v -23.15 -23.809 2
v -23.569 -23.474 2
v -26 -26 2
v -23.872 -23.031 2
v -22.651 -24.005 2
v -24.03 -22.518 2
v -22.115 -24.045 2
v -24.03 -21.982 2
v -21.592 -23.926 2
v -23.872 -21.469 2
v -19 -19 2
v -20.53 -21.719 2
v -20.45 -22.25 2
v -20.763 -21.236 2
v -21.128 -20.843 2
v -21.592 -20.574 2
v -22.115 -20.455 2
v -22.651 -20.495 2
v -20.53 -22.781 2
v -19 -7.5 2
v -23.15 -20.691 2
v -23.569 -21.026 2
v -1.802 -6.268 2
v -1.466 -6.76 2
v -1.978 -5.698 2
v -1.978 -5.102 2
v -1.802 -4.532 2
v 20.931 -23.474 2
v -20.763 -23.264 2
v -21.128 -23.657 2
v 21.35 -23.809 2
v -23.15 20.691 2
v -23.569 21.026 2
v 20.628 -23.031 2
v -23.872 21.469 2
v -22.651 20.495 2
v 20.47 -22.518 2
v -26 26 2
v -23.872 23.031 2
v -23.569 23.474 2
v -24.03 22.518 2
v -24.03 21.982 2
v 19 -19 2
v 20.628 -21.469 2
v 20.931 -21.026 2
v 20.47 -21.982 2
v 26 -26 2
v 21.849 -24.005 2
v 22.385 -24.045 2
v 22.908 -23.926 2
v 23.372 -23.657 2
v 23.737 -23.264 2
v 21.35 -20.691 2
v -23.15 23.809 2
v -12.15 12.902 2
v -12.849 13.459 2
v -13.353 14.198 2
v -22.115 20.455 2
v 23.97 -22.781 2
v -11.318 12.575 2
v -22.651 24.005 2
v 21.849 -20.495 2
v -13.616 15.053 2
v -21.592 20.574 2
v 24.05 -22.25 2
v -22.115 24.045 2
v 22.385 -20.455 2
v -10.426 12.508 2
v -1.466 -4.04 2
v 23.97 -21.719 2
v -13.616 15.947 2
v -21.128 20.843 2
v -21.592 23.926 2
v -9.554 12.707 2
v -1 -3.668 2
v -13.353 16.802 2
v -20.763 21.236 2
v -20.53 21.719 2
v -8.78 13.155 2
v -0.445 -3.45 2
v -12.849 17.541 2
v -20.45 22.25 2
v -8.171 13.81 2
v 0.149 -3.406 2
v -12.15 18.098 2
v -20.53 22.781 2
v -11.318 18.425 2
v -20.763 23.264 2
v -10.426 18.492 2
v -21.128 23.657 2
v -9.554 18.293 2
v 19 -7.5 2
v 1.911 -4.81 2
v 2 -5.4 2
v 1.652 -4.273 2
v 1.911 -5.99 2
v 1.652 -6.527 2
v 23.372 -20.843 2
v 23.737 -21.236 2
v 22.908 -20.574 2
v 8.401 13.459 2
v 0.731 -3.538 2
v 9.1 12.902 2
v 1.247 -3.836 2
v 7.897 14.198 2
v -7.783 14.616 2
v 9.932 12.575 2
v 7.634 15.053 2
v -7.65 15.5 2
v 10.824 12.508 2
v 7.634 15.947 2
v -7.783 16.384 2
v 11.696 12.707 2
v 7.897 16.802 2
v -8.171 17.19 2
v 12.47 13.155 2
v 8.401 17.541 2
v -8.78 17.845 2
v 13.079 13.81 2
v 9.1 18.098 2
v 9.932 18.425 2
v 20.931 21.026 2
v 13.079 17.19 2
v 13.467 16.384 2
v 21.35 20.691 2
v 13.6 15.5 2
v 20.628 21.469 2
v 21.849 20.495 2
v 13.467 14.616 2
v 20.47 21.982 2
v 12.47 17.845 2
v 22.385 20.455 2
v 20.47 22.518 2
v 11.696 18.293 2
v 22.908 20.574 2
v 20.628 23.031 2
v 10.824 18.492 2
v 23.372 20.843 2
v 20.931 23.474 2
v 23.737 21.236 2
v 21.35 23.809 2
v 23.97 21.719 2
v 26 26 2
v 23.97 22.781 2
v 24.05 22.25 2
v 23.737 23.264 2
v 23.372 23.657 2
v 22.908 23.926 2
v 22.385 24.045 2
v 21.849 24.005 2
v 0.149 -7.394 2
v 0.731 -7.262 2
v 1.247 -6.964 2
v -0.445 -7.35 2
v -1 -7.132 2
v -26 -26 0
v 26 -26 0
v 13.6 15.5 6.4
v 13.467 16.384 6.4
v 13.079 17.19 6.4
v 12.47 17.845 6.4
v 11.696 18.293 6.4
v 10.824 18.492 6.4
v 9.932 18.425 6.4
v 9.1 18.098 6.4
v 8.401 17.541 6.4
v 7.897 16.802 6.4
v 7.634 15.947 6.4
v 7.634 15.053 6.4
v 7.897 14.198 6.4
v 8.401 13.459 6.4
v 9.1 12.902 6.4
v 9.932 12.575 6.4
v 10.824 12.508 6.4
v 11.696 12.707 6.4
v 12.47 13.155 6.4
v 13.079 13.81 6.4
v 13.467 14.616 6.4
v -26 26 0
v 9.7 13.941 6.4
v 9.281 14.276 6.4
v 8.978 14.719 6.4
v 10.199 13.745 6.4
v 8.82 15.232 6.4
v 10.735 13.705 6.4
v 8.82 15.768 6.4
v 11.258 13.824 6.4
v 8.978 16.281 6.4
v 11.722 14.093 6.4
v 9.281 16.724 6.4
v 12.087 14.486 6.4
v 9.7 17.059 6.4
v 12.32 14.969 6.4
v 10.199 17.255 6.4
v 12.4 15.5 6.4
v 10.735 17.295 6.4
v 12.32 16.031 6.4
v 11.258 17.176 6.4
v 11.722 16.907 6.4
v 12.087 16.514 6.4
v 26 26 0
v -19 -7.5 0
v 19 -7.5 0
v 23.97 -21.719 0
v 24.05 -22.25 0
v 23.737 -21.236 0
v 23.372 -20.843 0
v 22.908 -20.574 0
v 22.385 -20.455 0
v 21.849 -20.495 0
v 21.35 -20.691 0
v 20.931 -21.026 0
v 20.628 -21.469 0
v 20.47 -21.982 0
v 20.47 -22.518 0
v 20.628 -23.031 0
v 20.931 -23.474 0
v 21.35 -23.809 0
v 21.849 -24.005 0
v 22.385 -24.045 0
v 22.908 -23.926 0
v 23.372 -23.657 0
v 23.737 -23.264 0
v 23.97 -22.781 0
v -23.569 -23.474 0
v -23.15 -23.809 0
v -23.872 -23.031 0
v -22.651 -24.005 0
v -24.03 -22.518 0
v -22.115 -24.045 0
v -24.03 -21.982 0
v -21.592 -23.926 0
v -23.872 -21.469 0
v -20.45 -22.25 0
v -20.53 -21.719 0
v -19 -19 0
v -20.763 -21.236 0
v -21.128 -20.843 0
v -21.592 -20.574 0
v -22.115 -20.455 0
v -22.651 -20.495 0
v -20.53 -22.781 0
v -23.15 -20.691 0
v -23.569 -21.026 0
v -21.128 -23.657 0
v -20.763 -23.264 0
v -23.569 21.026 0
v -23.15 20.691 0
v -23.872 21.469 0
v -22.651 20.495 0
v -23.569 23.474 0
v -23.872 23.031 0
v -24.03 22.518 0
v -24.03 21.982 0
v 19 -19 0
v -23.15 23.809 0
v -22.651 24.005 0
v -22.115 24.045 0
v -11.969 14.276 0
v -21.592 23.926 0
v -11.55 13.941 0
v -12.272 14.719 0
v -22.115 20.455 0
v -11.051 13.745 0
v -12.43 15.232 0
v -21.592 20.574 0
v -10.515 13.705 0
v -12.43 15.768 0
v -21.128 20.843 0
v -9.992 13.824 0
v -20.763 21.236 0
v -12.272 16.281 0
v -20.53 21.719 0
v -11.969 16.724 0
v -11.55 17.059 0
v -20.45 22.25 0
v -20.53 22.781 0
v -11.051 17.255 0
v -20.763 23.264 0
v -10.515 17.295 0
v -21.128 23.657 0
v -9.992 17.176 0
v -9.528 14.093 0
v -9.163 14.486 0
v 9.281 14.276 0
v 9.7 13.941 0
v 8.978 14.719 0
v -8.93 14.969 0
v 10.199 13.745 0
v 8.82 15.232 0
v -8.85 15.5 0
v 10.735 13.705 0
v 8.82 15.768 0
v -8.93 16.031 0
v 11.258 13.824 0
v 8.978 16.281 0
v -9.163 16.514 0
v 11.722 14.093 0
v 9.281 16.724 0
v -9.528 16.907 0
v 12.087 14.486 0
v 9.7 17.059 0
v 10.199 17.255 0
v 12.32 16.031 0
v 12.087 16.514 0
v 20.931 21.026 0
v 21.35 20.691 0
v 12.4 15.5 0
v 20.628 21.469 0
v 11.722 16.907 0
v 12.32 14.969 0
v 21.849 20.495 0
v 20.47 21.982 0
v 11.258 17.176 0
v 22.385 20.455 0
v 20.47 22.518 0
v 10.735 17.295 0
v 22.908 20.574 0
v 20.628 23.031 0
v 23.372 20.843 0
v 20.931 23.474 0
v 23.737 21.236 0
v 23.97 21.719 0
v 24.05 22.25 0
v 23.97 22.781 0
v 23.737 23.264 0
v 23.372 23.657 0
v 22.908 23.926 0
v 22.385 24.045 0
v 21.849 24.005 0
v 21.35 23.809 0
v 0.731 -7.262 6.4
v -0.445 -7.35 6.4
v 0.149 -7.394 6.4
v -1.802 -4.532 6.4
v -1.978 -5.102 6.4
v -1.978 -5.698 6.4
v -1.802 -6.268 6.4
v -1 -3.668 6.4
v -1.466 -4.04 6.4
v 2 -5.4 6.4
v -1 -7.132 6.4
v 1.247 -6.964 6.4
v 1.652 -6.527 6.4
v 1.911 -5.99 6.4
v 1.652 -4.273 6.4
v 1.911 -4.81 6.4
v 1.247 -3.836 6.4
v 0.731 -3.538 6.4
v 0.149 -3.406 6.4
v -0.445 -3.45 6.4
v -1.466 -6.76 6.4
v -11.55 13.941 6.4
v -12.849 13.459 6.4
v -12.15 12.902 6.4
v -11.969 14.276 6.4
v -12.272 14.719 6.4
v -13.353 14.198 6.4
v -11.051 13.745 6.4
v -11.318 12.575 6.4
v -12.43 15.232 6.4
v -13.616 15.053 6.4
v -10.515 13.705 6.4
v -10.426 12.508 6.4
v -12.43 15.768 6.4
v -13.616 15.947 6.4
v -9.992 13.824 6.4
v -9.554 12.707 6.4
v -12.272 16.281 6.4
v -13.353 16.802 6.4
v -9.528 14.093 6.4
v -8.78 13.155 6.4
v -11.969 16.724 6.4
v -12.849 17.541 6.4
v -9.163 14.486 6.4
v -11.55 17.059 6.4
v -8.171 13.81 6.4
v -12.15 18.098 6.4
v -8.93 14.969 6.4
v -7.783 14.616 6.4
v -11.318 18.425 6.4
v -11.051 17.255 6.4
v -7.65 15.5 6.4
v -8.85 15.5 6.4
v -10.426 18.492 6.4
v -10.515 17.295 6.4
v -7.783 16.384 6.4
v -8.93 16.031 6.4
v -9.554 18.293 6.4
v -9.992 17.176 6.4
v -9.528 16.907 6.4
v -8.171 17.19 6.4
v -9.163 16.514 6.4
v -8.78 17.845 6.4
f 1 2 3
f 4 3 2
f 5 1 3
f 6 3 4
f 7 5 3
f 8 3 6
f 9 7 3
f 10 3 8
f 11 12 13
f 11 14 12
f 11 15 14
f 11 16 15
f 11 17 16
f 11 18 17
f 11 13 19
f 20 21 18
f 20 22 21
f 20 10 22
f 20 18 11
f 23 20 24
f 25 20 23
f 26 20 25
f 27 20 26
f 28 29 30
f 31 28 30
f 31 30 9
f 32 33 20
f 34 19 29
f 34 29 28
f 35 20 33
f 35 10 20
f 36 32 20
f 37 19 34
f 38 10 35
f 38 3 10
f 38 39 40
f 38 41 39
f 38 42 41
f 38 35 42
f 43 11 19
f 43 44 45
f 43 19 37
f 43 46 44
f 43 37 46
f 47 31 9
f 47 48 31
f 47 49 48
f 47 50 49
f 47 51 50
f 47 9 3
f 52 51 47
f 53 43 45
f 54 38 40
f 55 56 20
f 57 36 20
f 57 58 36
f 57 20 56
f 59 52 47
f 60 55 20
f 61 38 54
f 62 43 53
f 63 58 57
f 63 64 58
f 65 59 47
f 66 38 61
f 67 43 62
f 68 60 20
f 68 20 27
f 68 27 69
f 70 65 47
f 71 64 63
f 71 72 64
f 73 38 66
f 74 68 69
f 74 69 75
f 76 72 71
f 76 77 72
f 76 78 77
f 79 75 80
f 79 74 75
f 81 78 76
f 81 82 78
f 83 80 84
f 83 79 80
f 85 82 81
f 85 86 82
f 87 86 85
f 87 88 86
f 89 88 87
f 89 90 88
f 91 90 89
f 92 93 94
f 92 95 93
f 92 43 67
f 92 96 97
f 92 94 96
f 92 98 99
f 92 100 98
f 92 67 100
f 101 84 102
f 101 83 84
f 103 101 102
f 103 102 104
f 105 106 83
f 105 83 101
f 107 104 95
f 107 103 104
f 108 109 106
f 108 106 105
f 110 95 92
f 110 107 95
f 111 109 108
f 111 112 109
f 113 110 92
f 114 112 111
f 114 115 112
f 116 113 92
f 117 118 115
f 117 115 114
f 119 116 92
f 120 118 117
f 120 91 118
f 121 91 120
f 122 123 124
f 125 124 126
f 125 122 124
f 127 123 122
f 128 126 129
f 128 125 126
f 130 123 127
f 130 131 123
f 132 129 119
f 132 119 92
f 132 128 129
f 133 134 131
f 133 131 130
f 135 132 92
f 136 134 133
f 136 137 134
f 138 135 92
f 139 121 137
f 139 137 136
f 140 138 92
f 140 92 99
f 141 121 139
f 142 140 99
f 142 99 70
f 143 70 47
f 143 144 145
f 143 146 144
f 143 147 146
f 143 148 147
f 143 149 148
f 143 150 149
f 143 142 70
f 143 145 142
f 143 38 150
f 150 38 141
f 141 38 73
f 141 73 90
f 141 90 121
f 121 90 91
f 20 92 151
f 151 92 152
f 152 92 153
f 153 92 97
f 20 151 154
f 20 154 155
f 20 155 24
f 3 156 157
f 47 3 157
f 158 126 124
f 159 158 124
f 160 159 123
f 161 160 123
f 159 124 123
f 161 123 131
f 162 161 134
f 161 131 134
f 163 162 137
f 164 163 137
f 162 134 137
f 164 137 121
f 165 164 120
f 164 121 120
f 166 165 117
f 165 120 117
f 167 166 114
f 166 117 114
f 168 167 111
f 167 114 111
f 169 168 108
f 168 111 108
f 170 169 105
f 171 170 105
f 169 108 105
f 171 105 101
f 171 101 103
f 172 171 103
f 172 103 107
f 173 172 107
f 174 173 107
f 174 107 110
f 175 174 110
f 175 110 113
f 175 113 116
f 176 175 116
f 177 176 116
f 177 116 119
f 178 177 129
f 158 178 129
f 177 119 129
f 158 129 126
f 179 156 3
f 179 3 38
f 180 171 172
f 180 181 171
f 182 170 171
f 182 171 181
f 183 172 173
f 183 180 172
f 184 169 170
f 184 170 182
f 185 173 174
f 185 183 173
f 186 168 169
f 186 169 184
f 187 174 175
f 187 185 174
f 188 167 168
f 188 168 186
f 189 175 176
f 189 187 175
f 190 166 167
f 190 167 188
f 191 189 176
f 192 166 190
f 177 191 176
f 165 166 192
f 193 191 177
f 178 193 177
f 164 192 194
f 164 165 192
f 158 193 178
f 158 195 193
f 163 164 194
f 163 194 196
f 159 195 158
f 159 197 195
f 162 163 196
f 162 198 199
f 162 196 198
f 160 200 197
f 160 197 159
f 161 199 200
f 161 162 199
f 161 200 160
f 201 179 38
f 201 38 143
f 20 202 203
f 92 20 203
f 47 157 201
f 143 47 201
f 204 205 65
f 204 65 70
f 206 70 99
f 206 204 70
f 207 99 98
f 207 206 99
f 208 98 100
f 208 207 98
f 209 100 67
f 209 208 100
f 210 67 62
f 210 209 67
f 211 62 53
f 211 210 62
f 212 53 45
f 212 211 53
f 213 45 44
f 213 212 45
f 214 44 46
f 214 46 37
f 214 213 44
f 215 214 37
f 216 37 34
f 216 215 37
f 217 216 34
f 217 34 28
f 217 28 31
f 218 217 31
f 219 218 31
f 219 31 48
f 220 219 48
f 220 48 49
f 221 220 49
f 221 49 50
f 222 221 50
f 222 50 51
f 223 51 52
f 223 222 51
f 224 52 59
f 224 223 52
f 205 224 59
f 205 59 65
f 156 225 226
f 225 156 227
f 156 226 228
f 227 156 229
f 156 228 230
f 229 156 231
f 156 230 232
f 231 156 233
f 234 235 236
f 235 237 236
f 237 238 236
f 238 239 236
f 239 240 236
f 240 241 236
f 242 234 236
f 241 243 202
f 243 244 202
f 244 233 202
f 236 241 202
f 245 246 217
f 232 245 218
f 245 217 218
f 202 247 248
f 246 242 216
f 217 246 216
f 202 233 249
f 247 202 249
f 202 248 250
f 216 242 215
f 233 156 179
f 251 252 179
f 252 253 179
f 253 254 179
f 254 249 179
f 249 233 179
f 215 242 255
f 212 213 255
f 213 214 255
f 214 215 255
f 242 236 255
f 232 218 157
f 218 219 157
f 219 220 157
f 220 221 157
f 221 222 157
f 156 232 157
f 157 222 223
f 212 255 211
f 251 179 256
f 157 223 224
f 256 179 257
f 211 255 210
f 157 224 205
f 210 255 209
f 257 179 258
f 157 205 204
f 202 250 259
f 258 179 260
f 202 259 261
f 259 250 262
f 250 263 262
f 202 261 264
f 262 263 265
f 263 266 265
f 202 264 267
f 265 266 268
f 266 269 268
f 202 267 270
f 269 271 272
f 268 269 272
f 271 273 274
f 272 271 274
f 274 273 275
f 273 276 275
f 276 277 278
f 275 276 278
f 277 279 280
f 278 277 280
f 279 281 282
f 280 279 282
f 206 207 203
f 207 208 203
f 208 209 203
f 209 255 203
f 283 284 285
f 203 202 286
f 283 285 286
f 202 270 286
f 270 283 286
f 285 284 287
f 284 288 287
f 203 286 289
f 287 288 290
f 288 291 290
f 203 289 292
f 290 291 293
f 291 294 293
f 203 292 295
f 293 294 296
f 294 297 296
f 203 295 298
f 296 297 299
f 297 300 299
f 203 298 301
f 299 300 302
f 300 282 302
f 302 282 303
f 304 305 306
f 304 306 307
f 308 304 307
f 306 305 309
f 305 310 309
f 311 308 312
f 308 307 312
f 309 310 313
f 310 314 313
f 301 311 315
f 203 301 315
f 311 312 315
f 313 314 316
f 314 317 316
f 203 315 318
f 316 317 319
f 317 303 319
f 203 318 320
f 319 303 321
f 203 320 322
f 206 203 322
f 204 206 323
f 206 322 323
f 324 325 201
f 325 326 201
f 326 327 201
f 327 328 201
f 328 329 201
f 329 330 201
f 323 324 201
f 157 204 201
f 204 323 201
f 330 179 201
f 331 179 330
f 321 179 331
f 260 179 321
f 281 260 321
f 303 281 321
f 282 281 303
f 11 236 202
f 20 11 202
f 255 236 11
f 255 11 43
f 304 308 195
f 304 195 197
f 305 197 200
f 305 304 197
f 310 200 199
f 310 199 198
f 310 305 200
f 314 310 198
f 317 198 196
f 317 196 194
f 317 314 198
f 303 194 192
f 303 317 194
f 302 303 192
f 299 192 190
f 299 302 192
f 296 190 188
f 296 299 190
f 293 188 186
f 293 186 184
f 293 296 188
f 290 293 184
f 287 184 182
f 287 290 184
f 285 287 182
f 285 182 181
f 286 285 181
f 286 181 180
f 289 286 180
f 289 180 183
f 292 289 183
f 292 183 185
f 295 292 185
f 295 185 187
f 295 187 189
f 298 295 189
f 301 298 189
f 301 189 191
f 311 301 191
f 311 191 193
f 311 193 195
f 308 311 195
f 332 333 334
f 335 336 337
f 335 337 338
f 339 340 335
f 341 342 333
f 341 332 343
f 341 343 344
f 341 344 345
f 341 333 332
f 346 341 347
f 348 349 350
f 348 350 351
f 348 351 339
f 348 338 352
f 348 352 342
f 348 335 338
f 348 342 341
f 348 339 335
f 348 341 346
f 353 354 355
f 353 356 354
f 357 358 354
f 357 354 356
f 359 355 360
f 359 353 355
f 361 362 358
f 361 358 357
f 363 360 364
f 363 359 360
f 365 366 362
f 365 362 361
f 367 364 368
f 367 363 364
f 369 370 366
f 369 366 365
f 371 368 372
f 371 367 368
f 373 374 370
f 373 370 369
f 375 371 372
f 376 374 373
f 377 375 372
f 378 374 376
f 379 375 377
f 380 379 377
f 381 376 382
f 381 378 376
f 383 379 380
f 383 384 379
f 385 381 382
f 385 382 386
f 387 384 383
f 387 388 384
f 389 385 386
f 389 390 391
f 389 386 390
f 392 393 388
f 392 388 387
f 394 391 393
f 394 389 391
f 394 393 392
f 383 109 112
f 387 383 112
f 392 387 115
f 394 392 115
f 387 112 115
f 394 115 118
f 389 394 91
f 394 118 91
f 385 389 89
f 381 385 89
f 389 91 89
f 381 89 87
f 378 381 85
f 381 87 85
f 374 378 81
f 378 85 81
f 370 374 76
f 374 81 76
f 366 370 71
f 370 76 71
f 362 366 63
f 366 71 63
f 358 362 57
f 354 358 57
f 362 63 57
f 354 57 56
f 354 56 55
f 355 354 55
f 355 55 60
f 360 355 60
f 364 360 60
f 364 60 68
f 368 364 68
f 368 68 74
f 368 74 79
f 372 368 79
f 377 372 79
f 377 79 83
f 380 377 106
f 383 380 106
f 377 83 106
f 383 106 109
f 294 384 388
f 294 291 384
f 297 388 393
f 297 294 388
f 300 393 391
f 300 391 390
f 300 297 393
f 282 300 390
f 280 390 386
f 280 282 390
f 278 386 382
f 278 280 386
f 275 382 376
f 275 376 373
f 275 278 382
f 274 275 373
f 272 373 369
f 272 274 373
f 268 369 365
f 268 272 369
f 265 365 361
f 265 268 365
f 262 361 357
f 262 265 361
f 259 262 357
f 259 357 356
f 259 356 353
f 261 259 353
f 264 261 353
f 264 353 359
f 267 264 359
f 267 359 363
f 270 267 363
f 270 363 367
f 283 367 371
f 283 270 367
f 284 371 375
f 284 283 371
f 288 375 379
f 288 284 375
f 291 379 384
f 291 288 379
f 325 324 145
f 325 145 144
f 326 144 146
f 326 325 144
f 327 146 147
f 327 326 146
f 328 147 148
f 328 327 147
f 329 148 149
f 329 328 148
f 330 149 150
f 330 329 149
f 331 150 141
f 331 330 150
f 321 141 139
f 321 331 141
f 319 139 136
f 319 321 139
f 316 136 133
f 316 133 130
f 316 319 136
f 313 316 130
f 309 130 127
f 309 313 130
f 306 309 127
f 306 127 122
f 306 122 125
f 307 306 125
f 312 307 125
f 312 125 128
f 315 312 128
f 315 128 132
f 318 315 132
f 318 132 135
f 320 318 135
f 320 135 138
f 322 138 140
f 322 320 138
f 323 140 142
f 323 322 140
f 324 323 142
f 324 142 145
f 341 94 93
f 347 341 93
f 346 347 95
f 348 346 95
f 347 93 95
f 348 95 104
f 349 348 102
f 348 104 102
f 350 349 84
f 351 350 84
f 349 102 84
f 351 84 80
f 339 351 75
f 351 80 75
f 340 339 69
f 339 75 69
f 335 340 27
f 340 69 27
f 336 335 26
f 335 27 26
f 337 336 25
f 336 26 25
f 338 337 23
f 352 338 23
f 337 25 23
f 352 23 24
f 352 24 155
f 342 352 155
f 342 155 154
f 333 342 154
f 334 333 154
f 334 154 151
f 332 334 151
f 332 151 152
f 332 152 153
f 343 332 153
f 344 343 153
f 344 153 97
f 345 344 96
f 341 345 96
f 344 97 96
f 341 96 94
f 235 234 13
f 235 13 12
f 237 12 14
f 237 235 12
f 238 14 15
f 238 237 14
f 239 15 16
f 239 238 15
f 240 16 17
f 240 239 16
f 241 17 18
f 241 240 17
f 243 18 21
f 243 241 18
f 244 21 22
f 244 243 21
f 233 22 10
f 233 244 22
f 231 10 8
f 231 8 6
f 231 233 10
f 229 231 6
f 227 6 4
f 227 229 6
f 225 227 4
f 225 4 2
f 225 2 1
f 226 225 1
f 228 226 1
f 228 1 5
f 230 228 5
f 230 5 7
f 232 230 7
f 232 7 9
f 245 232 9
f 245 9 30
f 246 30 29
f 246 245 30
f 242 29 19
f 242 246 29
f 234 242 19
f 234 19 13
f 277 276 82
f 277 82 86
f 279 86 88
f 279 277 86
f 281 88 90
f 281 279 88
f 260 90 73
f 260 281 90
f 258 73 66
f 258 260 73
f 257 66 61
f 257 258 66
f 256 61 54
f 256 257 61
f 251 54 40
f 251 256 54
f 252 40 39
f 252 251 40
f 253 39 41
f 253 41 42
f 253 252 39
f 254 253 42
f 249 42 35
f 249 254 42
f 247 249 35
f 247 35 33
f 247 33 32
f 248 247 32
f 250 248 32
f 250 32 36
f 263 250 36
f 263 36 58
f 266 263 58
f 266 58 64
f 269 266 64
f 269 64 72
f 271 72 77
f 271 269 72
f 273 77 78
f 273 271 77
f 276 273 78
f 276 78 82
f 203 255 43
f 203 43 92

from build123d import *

# Parameters (mm, degrees)
SKETCH_W      = 52
SKETCH_H      = 52
SKETCH_R      = 1.8
SKETCH_W_2    = 38
SKETCH_H_2    = 11.5
PAD_DEPTH     = 2
SKETCH001_R   = 2
SKETCH001_R_2 = 3
SKETCH001_R_3 = 1.8
PAD001_DEPTH  = 4.4


with BuildPart() as part:
    # Sketch → Pad (new body)
    with BuildSketch(Plane.XY):
        Rectangle(SKETCH_W, SKETCH_H)
        with Locations((22.25, 22.25)):
            Circle(SKETCH_R, mode=Mode.SUBTRACT)
        with Locations((22.25, -22.25)):
            Circle(SKETCH_R, mode=Mode.SUBTRACT)
        with Locations((-22.25, 22.25)):
            Circle(SKETCH_R, mode=Mode.SUBTRACT)
        with Locations((-22.25, -22.25)):
            Circle(SKETCH_R, mode=Mode.SUBTRACT)
        with Locations((-10.65, 15.5)):
            Circle(SKETCH_R, mode=Mode.SUBTRACT)
        with Locations((10.6, 15.5)):
            Circle(SKETCH_R, mode=Mode.SUBTRACT)
        with Locations((0, -13.25)):
            Rectangle(SKETCH_W_2, SKETCH_H_2, mode=Mode.SUBTRACT)
    extrude(amount=PAD_DEPTH)

    # Sketch001 → Pad001 (new body)
    with BuildSketch(Plane.XY.offset(2)):
        with Locations((0, -5.4)):
            Circle(SKETCH001_R)
        with Locations((-10.65, 15.5)):
            Circle(SKETCH001_R_2)
        with Locations((-10.65, 15.5)):
            Circle(SKETCH001_R_3, mode=Mode.SUBTRACT)
        with Locations((10.6, 15.5)):
            Circle(SKETCH001_R_2)
        with Locations((10.6, 15.5)):
            Circle(SKETCH001_R_3, mode=Mode.SUBTRACT)
    extrude(amount=PAD001_DEPTH)


solid = part.part
